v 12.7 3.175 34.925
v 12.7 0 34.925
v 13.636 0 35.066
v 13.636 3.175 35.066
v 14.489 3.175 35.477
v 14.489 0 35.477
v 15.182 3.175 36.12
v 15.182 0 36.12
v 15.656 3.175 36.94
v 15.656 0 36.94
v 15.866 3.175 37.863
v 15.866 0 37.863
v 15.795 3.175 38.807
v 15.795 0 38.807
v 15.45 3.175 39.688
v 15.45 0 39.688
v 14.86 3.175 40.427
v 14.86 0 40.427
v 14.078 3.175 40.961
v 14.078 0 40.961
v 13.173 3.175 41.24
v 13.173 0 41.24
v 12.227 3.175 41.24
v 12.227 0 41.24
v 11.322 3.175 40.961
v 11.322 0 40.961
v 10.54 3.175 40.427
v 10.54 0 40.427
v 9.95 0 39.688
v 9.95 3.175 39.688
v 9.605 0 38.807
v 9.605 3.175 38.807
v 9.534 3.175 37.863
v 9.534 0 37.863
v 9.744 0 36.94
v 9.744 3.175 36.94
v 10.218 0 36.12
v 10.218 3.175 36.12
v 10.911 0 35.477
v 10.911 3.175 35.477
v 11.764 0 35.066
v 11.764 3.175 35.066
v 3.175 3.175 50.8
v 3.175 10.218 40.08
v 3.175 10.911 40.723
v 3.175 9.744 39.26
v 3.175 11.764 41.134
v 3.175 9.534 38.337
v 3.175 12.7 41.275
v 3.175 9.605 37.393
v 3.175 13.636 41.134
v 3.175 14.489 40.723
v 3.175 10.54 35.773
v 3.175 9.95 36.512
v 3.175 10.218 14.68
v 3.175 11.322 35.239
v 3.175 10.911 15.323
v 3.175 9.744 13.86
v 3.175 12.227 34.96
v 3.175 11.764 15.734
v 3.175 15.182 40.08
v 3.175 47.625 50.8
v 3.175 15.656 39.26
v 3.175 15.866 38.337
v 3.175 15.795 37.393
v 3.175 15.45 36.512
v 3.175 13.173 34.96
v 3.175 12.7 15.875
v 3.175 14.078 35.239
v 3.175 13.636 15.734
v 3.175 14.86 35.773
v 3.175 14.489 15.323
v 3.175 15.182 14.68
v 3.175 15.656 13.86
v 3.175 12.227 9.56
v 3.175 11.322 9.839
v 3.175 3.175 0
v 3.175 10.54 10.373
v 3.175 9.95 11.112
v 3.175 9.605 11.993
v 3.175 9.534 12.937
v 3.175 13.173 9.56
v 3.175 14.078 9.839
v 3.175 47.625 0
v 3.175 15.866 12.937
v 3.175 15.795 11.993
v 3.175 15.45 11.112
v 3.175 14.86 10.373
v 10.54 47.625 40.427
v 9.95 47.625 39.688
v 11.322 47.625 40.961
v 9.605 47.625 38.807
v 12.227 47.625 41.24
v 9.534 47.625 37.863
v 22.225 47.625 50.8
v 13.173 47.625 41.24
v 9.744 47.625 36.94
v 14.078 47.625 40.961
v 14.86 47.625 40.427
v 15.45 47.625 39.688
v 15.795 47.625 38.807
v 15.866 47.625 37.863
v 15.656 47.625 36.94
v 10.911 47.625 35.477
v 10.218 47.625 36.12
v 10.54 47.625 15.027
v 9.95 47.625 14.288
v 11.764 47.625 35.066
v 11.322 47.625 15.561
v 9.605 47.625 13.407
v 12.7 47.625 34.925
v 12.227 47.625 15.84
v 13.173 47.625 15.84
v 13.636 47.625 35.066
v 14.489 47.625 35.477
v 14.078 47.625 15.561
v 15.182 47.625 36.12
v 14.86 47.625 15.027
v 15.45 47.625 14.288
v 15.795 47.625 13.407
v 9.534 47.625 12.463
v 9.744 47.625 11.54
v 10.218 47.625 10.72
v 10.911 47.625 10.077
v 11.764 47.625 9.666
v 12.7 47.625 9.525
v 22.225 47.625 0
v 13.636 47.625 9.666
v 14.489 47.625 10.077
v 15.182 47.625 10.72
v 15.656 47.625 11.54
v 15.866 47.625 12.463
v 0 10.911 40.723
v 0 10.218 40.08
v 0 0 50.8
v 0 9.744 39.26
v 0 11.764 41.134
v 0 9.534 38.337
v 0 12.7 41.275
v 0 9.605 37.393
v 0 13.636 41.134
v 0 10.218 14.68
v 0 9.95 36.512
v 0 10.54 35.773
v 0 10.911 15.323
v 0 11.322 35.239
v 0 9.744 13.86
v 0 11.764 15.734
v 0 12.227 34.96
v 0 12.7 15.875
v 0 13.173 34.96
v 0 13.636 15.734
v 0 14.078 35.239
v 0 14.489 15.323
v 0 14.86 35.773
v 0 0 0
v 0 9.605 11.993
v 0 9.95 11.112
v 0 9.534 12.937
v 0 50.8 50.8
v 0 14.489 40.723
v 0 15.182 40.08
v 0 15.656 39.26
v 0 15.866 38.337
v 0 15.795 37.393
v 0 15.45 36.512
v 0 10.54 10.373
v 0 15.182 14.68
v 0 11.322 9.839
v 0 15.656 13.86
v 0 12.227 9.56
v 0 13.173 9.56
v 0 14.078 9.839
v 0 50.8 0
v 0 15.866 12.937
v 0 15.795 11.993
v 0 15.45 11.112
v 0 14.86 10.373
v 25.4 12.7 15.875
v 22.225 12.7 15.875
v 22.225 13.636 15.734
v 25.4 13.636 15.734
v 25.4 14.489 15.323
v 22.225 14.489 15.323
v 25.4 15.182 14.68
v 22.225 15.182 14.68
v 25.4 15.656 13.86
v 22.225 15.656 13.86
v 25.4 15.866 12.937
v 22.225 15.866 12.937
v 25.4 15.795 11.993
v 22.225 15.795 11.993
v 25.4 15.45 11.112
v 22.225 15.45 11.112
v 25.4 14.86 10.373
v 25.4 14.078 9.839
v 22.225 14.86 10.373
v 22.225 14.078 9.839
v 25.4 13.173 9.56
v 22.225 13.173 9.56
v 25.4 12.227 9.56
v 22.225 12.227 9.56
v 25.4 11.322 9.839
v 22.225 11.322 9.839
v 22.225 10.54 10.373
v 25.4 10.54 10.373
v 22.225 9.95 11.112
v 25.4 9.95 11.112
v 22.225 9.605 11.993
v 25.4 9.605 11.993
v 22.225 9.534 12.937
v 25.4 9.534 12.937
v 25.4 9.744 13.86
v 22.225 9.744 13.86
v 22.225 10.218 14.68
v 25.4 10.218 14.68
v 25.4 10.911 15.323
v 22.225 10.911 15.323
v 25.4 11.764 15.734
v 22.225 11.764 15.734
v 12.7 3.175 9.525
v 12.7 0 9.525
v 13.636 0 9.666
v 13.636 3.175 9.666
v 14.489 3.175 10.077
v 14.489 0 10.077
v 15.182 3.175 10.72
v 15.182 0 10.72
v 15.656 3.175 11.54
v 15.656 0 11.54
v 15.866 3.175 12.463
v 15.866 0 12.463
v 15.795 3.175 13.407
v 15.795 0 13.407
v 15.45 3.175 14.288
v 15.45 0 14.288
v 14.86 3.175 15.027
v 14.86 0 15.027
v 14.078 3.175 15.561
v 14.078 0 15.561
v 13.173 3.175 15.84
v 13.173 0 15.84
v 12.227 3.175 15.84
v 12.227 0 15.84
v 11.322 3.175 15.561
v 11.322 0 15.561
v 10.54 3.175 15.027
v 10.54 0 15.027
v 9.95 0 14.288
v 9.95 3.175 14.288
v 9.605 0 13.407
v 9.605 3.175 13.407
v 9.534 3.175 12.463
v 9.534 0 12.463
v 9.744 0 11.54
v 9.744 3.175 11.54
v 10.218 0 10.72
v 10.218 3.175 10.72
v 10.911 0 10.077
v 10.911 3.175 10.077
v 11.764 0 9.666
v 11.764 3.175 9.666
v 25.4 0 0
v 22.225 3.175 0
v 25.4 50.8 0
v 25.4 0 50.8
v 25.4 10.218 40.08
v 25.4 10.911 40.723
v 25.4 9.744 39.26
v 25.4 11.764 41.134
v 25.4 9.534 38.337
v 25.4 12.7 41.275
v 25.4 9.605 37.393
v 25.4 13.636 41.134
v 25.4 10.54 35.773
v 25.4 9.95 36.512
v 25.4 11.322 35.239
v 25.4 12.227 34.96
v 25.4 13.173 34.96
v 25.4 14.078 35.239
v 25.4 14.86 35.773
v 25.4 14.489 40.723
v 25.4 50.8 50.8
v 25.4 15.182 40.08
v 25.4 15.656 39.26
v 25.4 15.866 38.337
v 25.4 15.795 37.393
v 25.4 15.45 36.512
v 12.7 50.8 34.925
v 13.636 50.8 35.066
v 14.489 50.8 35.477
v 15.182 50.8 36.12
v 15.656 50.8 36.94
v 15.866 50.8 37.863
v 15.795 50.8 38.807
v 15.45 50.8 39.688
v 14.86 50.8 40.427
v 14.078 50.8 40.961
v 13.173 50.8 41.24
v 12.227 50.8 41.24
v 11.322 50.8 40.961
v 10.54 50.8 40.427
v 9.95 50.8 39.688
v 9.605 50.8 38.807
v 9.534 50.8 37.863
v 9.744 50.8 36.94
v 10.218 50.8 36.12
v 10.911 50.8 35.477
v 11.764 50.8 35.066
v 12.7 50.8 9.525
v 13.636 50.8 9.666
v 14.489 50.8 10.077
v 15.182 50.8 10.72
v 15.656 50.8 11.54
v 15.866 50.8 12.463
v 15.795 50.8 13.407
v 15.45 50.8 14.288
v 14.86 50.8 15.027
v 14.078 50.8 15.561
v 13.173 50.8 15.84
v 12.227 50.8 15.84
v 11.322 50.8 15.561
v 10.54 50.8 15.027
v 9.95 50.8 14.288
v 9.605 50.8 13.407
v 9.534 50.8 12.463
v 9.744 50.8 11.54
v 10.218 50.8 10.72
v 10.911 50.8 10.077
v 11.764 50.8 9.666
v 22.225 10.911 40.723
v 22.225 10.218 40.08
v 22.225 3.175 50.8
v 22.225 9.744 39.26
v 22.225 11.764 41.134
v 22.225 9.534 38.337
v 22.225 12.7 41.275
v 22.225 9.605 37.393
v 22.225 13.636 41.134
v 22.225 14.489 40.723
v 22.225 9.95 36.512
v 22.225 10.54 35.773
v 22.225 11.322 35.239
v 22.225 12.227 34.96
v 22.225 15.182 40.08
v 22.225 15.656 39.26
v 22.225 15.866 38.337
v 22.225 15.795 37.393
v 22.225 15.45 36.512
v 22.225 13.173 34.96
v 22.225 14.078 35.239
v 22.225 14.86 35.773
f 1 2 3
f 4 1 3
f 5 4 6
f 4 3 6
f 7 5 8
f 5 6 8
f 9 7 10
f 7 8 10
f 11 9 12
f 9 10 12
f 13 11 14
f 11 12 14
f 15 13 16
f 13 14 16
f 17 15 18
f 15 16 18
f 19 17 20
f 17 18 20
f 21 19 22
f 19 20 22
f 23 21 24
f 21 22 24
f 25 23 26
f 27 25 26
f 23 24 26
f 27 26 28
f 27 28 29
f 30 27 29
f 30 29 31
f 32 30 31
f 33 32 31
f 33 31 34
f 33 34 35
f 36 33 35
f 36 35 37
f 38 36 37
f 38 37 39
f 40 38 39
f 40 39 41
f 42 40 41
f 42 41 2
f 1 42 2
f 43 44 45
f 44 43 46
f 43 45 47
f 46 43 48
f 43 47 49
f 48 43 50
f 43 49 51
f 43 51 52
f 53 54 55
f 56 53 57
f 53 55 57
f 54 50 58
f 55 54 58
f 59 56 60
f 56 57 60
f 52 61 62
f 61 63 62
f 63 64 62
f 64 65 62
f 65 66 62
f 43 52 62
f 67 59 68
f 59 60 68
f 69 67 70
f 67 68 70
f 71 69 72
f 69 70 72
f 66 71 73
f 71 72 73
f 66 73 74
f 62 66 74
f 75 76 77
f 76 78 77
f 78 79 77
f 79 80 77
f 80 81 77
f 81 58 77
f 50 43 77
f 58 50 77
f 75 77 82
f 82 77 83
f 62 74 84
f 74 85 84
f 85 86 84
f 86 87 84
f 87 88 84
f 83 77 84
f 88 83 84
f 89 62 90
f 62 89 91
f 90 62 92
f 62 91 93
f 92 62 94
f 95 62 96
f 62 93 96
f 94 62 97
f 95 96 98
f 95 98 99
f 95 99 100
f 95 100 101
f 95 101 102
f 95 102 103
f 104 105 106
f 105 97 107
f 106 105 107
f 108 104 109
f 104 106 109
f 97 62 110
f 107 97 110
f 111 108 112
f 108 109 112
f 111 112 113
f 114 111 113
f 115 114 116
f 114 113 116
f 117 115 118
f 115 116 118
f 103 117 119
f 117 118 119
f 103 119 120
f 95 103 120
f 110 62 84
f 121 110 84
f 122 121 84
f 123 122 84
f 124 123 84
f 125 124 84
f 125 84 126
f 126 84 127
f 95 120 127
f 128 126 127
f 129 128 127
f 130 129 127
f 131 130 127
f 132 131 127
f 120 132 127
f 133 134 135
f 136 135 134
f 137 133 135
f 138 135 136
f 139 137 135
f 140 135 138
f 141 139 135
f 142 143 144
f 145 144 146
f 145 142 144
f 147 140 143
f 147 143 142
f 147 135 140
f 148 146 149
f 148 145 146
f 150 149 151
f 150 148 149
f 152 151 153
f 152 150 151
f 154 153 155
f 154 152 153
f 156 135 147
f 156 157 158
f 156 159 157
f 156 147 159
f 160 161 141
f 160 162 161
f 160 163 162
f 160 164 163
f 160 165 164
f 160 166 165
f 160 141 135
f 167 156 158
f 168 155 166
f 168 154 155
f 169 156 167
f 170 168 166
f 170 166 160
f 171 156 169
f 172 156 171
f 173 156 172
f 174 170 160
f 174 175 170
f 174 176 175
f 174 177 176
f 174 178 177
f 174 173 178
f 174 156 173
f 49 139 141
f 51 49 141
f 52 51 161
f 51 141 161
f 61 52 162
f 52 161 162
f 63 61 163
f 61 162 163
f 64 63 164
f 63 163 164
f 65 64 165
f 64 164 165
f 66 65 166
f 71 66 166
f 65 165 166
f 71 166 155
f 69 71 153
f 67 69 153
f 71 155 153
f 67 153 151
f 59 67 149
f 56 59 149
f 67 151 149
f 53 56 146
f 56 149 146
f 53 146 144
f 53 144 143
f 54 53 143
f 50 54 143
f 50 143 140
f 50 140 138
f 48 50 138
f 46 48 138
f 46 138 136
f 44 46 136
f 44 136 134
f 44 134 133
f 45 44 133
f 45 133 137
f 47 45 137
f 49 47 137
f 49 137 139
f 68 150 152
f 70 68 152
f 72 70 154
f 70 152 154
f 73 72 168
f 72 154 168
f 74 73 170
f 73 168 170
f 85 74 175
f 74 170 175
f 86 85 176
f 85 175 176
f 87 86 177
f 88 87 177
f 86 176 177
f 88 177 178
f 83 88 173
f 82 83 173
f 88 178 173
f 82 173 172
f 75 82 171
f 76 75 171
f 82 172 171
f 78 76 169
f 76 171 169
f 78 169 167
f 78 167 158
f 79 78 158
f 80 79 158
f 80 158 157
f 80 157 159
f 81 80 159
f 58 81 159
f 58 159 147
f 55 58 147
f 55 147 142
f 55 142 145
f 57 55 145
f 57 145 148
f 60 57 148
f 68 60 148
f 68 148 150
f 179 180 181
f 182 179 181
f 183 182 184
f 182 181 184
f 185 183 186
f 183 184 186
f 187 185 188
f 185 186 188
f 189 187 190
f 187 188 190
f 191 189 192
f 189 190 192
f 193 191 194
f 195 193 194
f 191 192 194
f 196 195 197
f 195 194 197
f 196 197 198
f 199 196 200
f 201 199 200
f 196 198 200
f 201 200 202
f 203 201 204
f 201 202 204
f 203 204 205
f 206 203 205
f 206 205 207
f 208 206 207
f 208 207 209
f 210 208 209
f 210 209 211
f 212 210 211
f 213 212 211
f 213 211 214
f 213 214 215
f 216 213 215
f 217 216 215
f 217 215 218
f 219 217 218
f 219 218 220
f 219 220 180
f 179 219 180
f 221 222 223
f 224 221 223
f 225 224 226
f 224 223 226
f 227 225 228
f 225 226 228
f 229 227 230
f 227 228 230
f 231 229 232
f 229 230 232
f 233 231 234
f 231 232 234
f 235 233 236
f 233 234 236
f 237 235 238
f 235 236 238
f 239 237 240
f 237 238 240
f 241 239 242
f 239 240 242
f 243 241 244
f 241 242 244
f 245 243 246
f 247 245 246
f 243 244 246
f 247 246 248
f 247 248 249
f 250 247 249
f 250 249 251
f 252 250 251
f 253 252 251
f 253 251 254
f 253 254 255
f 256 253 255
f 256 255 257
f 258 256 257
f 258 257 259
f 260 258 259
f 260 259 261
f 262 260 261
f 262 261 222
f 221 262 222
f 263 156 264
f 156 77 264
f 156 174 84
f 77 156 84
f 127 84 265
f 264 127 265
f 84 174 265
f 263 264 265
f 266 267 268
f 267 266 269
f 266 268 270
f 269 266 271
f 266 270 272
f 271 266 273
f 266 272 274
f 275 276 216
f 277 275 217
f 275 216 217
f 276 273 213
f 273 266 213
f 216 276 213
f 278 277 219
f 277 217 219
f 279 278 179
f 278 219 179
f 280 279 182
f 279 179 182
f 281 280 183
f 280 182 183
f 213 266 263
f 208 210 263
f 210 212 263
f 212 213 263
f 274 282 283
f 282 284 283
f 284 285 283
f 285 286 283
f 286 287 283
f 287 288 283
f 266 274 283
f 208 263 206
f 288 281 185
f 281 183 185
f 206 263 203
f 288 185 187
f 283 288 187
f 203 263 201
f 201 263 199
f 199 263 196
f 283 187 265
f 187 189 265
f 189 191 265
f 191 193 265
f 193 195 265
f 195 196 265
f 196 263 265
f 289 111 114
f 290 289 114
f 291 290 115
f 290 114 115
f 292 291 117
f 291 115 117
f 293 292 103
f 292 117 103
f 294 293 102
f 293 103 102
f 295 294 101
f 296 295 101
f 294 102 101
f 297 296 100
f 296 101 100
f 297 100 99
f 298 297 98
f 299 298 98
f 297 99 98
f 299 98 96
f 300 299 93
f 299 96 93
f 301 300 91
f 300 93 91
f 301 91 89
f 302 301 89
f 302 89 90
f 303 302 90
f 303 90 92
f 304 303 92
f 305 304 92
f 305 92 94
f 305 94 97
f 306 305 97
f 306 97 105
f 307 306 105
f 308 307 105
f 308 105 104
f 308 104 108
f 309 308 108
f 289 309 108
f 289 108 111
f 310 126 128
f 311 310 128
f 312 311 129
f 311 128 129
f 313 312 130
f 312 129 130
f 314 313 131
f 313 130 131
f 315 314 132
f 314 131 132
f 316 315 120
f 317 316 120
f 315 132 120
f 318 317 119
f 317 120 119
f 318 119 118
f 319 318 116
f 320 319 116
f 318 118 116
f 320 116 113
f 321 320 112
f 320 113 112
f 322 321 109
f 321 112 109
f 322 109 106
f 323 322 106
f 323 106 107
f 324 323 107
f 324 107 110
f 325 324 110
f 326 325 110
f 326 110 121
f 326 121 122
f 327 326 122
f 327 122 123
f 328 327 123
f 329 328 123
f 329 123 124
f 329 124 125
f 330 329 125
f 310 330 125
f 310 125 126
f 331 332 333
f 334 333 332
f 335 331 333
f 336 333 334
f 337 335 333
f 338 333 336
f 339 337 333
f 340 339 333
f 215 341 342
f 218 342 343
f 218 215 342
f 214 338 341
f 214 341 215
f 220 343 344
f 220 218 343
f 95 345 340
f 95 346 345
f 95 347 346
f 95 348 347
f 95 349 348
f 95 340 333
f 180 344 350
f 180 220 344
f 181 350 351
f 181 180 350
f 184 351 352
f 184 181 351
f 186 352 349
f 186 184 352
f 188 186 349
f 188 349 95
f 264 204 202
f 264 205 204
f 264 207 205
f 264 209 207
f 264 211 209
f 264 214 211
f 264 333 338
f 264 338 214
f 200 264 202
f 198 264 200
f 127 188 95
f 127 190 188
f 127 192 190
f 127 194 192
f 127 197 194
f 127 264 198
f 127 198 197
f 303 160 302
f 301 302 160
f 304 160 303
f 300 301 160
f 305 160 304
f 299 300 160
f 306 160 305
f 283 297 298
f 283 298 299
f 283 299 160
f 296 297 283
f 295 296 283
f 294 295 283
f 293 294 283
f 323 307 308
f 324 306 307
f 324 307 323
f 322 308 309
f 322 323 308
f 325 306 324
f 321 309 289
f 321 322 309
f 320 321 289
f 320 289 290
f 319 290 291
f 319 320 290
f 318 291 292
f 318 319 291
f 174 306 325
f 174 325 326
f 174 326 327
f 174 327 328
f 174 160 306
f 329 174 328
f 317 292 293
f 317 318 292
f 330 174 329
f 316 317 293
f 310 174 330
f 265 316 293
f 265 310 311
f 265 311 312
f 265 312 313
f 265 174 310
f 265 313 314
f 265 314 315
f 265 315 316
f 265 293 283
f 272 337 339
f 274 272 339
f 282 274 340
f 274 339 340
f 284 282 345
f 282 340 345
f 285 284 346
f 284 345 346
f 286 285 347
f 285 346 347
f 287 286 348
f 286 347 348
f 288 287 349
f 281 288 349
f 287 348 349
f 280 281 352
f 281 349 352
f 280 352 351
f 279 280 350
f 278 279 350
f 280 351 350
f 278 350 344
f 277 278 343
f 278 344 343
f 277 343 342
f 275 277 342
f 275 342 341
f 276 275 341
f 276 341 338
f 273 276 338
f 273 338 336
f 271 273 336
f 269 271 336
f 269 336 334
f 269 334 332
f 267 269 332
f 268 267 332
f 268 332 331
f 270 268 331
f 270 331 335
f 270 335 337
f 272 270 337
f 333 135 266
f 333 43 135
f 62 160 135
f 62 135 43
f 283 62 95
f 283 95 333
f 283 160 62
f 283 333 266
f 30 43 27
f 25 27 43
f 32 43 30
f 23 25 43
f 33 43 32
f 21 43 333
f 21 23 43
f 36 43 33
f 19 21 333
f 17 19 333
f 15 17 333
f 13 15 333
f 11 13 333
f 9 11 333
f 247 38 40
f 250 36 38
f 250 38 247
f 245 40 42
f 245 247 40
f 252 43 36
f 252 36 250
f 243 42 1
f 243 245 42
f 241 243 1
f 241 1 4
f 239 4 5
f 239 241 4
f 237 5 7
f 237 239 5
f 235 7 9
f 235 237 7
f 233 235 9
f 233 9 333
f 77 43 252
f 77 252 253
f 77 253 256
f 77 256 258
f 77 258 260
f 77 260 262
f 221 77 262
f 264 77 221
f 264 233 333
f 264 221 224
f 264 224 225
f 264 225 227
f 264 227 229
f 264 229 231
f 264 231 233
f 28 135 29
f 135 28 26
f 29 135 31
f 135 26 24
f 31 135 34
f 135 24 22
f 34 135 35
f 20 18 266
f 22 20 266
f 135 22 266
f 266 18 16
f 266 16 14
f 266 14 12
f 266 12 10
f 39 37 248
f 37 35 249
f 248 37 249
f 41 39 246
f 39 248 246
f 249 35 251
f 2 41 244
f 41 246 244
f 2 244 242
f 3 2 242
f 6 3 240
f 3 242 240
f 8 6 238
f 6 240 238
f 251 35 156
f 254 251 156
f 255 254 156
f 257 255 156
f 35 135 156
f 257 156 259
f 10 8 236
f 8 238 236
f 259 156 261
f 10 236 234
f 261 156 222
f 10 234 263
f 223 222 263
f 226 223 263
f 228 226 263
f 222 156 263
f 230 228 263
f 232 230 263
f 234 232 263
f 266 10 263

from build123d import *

# Parameters (mm, degrees)
SKETCH1_W           = 25.4
SKETCH1_H           = 50.8
SKETCH1_W_2         = 19.05
SKETCH1_H_2         = 44.45
BOSS_EXTRUDE1_DEPTH = 50.8
SKETCH2_R           = 3.175
CUT_EXTRUDE1_DEPTH  = 50.8
SKETCH3_R           = 3.175
CUT_EXTRUDE2_DEPTH  = 50.8


with BuildPart() as part:
    # Sketch1 → Boss-Extrude1 (new body)
    with BuildSketch(Plane.XY):
        with Locations((12.7, 25.4)):
            Rectangle(SKETCH1_W, SKETCH1_H)
        with Locations((12.7, 25.4)):
            Rectangle(SKETCH1_W_2, SKETCH1_H_2, mode=Mode.SUBTRACT)
    extrude(amount=BOSS_EXTRUDE1_DEPTH)

    # Sketch2 → Cut-Extrude1 (cut)
    with BuildSketch(Plane.XZ):
        with Locations(Location((12.7, 38.1, 0), (0, 0, 270))):
            Circle(SKETCH2_R)
        with Locations(Location((12.7, 12.7, 0), (0, 0, 270))):
            Circle(SKETCH2_R)
    extrude(amount=-CUT_EXTRUDE1_DEPTH, mode=Mode.SUBTRACT)

    # Sketch3 → Cut-Extrude2 (cut)
    with BuildSketch(Plane.ZY):
        with Locations((38.1, 12.7)):
            Circle(SKETCH3_R)
        with Locations((12.7, 12.7)):
            Circle(SKETCH3_R)
    extrude(amount=-CUT_EXTRUDE2_DEPTH, mode=Mode.SUBTRACT)


solid = part.part
